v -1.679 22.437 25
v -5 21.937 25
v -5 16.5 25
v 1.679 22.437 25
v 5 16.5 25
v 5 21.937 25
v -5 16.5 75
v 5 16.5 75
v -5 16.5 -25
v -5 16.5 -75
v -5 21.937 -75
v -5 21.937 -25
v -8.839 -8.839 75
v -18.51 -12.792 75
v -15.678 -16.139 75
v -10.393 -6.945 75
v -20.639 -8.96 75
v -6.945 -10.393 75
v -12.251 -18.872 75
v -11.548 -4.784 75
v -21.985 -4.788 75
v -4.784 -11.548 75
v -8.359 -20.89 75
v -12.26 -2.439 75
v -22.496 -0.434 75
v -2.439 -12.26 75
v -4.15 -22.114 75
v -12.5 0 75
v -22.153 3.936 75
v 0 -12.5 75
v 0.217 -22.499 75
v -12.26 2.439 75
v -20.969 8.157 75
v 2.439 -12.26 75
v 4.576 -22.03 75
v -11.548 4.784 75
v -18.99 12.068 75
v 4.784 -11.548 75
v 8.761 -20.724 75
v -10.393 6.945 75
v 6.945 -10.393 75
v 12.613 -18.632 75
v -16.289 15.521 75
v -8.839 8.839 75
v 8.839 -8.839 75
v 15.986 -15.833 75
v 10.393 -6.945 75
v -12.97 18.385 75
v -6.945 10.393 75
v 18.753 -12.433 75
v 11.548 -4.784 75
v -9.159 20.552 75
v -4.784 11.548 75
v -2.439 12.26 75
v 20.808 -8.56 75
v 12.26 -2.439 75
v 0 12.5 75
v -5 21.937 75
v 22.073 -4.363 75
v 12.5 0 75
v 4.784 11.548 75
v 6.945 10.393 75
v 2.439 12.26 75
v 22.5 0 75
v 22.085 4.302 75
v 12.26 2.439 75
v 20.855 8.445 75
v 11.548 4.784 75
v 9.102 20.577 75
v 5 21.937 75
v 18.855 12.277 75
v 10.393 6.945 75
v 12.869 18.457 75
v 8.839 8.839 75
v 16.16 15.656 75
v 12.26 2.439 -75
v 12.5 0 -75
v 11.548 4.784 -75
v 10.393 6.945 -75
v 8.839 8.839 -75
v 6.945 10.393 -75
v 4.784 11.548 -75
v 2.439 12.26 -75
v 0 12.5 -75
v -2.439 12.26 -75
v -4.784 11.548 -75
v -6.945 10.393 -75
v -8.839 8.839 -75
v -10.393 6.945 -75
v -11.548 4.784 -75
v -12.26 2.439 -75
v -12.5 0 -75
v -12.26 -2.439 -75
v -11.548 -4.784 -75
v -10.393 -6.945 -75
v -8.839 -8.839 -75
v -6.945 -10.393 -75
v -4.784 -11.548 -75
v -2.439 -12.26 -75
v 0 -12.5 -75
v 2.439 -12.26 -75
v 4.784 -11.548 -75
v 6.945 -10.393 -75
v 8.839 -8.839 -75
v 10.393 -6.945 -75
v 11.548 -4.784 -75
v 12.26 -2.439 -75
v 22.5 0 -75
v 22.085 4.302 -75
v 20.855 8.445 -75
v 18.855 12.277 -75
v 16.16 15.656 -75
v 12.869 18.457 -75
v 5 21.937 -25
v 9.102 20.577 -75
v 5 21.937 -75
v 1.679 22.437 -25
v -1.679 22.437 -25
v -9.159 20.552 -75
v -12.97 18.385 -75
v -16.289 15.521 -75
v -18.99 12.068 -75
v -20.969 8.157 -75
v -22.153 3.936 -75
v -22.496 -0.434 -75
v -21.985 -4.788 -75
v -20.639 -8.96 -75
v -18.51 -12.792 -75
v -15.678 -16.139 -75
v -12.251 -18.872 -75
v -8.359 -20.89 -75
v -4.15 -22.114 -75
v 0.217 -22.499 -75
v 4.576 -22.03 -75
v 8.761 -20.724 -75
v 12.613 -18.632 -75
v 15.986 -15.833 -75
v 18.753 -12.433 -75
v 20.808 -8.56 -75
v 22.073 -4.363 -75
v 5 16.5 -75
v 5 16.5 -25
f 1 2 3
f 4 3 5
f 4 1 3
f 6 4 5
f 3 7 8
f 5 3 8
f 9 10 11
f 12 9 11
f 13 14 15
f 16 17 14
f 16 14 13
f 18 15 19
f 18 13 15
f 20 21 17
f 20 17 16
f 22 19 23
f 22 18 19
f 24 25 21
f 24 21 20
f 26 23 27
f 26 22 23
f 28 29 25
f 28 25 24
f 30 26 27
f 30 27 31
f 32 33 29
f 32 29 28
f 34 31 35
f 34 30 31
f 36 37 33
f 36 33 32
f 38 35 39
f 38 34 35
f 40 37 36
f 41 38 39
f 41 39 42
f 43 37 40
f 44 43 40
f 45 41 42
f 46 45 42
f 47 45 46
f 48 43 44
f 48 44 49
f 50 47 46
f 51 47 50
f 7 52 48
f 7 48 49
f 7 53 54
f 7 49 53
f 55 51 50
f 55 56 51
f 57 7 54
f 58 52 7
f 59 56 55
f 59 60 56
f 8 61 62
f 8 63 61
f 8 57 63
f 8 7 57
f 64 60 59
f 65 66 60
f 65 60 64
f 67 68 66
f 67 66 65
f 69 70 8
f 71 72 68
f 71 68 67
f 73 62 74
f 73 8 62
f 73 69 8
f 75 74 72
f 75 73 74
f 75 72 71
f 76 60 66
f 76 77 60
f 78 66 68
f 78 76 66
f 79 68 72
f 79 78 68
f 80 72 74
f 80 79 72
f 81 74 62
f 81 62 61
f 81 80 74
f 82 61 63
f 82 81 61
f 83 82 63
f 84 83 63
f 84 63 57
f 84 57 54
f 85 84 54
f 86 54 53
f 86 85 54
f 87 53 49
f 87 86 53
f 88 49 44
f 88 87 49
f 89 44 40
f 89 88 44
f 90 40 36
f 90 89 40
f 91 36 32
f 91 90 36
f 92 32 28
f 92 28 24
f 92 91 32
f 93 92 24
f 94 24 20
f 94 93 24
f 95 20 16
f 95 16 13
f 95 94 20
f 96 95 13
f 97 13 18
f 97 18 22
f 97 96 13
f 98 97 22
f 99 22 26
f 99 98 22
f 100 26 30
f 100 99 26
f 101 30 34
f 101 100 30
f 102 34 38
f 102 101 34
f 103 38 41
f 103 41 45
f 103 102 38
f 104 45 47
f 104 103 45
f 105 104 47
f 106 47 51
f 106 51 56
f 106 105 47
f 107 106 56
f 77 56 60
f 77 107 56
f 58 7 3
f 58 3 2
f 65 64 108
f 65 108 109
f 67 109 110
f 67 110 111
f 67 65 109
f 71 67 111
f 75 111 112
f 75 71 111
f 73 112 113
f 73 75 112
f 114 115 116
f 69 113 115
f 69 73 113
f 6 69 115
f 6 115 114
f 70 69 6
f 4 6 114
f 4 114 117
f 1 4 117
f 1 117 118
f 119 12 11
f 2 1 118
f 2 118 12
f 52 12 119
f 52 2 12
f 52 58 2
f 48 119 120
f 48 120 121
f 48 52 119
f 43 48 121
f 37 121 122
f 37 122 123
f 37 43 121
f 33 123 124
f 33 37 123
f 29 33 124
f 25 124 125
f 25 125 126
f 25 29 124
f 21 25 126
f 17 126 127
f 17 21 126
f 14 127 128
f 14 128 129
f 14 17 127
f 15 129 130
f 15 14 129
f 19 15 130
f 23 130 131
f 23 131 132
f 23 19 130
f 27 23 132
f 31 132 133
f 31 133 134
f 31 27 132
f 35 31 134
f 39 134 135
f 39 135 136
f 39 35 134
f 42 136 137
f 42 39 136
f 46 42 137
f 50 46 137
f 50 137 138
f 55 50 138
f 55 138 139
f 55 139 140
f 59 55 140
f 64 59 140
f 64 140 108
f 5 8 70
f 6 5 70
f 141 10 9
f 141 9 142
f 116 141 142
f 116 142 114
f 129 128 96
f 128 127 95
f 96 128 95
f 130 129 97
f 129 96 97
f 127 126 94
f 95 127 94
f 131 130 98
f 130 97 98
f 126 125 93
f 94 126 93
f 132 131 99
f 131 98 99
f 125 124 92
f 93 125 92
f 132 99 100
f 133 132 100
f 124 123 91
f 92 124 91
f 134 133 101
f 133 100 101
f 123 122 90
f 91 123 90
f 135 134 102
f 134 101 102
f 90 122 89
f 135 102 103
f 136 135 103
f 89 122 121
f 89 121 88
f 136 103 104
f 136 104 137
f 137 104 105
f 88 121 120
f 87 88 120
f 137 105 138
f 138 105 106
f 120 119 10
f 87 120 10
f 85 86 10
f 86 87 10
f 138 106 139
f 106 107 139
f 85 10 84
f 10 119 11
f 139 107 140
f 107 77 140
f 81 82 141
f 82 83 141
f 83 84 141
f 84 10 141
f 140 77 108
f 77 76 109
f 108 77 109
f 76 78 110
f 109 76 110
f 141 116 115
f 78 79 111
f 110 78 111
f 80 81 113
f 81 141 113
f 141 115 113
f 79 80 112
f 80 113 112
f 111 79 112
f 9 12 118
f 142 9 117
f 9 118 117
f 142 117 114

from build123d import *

# Parameters (mm, degrees)
SKETCH1_R           = 22.5
SKETCH1_R_2         = 12.5
BOSS_EXTRUDE1_DEPTH = 75
SKETCH2_W           = 10
SKETCH2_H           = 19.424824541
CUT_EXTRUDE1_DEPTH  = 50


with BuildPart() as part:
    # Sketch1 → Boss-Extrude1 (new, symmetric)
    with BuildSketch(Plane.XY):
        Circle(SKETCH1_R)
        Circle(SKETCH1_R_2, mode=Mode.SUBTRACT)
    extrude(amount=BOSS_EXTRUDE1_DEPTH, both=True)

    # Sketch2 → Cut-Extrude1 (cut)
    with BuildSketch(Plane.XY.offset(75)):
        with Locations((0, 26.21241227)):
            Rectangle(SKETCH2_W, SKETCH2_H)
    cut_extrude1 = extrude(amount=-CUT_EXTRUDE1_DEPTH, mode=Mode.SUBTRACT)

    # Mirror1: Cut-Extrude1 across plane
    add(cut_extrude1.mirror(Plane.XY), mode=Mode.SUBTRACT)


solid = part.part
